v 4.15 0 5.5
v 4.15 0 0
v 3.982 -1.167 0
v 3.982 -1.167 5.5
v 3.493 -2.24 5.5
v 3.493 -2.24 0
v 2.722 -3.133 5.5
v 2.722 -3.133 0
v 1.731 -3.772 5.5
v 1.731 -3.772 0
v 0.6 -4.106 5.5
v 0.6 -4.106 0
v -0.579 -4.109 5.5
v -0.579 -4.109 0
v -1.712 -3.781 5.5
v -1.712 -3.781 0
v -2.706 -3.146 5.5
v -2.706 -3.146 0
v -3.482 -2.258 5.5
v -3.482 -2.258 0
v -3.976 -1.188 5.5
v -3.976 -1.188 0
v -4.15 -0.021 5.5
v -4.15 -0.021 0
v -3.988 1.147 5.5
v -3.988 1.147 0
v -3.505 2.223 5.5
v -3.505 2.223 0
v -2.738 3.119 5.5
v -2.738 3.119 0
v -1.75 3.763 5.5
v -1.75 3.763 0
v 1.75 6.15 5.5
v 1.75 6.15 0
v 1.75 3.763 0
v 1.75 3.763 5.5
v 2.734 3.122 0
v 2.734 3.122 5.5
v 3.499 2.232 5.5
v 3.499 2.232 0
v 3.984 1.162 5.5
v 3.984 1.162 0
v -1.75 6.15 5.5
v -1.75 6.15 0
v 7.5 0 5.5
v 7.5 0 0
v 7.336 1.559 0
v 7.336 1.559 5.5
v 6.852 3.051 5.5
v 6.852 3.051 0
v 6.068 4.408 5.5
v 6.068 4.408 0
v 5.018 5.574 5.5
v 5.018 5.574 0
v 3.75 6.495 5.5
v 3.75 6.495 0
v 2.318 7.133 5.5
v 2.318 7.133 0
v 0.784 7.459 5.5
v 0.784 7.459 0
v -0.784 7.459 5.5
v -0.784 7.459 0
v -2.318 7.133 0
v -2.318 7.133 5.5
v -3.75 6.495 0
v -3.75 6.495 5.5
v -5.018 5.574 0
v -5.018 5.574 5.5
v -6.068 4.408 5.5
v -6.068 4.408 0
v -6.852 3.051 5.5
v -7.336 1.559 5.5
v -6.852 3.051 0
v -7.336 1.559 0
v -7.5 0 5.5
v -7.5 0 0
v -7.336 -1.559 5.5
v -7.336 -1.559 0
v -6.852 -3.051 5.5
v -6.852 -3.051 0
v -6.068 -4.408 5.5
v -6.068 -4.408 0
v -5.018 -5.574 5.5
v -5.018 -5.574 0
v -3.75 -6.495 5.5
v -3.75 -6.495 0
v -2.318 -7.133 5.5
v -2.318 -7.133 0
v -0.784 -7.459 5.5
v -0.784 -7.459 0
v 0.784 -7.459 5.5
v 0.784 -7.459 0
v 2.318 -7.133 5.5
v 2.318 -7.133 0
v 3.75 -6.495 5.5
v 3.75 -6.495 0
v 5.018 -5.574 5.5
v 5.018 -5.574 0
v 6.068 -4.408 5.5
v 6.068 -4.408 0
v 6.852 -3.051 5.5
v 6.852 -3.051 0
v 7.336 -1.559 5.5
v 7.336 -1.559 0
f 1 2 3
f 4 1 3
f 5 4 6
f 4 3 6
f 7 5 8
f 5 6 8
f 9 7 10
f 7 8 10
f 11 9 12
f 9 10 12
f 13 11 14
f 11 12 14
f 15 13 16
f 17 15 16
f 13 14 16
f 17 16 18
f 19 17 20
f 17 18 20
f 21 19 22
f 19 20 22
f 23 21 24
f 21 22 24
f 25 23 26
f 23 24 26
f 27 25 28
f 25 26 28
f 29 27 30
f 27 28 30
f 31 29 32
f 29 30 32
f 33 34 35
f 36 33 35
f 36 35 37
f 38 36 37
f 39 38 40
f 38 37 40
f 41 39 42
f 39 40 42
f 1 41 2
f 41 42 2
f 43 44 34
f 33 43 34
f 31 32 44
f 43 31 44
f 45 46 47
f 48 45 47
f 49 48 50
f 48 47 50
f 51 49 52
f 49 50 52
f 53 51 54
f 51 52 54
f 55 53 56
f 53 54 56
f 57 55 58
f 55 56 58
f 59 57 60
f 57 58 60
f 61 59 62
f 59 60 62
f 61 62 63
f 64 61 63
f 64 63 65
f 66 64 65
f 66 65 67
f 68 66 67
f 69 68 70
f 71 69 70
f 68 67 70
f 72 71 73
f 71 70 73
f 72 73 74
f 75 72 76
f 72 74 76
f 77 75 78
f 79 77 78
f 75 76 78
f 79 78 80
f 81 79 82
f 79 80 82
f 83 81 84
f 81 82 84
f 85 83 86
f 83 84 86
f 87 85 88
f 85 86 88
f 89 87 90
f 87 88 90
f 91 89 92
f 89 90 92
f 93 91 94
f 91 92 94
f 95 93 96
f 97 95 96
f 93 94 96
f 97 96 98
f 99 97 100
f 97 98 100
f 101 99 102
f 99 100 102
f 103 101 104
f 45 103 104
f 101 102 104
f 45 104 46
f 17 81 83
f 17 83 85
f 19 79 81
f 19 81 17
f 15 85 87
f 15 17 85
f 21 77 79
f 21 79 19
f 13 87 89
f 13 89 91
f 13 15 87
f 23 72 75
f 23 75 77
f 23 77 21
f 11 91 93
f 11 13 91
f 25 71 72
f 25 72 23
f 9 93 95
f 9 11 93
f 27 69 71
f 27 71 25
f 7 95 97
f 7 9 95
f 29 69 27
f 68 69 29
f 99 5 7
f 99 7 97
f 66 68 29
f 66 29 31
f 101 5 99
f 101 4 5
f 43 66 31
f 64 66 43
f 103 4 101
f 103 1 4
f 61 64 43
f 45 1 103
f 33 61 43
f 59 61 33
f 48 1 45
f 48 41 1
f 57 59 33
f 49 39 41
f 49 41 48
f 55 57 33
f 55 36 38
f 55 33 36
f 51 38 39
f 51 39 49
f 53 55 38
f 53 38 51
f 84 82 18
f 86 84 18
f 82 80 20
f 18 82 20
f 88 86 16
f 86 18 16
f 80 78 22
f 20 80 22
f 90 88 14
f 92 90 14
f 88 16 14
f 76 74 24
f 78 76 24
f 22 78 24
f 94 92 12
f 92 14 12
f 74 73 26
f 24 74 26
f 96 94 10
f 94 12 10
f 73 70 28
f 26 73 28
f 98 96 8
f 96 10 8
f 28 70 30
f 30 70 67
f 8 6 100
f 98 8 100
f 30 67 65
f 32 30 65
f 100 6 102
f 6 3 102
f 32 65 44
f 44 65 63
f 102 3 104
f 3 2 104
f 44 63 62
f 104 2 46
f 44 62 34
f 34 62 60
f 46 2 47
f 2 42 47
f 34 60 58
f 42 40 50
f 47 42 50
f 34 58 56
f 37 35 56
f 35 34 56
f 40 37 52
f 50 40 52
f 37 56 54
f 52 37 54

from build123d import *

# Parameters (mm, degrees)
SKIZZE1_R                       = 7.5
AUFSATZ_LINEAR_AUSTRAGEN1_DEPTH = 5.5


with BuildPart() as part:
    # Skizze1 → Aufsatz-Linear austragen1 (new body)
    with BuildSketch(Plane.XY):
        Circle(SKIZZE1_R)
        with BuildLine():
            ThreePointArc((4.15, 0), (-2.23159136, -3.498928407), (-1.75, 3.762977544))
            Line((-1.75, 3.762977544), (-1.75, 6.15))
            Line((-1.75, 6.15), (1.75, 6.15))
            Line((1.75, 6.15), (1.75, 3.762977544))
            ThreePointArc((1.75, 3.762977544), (3.498928407, 2.23159136), (4.15, 0))
        make_face(mode=Mode.SUBTRACT)
    extrude(amount=AUFSATZ_LINEAR_AUSTRAGEN1_DEPTH)


solid = part.part
